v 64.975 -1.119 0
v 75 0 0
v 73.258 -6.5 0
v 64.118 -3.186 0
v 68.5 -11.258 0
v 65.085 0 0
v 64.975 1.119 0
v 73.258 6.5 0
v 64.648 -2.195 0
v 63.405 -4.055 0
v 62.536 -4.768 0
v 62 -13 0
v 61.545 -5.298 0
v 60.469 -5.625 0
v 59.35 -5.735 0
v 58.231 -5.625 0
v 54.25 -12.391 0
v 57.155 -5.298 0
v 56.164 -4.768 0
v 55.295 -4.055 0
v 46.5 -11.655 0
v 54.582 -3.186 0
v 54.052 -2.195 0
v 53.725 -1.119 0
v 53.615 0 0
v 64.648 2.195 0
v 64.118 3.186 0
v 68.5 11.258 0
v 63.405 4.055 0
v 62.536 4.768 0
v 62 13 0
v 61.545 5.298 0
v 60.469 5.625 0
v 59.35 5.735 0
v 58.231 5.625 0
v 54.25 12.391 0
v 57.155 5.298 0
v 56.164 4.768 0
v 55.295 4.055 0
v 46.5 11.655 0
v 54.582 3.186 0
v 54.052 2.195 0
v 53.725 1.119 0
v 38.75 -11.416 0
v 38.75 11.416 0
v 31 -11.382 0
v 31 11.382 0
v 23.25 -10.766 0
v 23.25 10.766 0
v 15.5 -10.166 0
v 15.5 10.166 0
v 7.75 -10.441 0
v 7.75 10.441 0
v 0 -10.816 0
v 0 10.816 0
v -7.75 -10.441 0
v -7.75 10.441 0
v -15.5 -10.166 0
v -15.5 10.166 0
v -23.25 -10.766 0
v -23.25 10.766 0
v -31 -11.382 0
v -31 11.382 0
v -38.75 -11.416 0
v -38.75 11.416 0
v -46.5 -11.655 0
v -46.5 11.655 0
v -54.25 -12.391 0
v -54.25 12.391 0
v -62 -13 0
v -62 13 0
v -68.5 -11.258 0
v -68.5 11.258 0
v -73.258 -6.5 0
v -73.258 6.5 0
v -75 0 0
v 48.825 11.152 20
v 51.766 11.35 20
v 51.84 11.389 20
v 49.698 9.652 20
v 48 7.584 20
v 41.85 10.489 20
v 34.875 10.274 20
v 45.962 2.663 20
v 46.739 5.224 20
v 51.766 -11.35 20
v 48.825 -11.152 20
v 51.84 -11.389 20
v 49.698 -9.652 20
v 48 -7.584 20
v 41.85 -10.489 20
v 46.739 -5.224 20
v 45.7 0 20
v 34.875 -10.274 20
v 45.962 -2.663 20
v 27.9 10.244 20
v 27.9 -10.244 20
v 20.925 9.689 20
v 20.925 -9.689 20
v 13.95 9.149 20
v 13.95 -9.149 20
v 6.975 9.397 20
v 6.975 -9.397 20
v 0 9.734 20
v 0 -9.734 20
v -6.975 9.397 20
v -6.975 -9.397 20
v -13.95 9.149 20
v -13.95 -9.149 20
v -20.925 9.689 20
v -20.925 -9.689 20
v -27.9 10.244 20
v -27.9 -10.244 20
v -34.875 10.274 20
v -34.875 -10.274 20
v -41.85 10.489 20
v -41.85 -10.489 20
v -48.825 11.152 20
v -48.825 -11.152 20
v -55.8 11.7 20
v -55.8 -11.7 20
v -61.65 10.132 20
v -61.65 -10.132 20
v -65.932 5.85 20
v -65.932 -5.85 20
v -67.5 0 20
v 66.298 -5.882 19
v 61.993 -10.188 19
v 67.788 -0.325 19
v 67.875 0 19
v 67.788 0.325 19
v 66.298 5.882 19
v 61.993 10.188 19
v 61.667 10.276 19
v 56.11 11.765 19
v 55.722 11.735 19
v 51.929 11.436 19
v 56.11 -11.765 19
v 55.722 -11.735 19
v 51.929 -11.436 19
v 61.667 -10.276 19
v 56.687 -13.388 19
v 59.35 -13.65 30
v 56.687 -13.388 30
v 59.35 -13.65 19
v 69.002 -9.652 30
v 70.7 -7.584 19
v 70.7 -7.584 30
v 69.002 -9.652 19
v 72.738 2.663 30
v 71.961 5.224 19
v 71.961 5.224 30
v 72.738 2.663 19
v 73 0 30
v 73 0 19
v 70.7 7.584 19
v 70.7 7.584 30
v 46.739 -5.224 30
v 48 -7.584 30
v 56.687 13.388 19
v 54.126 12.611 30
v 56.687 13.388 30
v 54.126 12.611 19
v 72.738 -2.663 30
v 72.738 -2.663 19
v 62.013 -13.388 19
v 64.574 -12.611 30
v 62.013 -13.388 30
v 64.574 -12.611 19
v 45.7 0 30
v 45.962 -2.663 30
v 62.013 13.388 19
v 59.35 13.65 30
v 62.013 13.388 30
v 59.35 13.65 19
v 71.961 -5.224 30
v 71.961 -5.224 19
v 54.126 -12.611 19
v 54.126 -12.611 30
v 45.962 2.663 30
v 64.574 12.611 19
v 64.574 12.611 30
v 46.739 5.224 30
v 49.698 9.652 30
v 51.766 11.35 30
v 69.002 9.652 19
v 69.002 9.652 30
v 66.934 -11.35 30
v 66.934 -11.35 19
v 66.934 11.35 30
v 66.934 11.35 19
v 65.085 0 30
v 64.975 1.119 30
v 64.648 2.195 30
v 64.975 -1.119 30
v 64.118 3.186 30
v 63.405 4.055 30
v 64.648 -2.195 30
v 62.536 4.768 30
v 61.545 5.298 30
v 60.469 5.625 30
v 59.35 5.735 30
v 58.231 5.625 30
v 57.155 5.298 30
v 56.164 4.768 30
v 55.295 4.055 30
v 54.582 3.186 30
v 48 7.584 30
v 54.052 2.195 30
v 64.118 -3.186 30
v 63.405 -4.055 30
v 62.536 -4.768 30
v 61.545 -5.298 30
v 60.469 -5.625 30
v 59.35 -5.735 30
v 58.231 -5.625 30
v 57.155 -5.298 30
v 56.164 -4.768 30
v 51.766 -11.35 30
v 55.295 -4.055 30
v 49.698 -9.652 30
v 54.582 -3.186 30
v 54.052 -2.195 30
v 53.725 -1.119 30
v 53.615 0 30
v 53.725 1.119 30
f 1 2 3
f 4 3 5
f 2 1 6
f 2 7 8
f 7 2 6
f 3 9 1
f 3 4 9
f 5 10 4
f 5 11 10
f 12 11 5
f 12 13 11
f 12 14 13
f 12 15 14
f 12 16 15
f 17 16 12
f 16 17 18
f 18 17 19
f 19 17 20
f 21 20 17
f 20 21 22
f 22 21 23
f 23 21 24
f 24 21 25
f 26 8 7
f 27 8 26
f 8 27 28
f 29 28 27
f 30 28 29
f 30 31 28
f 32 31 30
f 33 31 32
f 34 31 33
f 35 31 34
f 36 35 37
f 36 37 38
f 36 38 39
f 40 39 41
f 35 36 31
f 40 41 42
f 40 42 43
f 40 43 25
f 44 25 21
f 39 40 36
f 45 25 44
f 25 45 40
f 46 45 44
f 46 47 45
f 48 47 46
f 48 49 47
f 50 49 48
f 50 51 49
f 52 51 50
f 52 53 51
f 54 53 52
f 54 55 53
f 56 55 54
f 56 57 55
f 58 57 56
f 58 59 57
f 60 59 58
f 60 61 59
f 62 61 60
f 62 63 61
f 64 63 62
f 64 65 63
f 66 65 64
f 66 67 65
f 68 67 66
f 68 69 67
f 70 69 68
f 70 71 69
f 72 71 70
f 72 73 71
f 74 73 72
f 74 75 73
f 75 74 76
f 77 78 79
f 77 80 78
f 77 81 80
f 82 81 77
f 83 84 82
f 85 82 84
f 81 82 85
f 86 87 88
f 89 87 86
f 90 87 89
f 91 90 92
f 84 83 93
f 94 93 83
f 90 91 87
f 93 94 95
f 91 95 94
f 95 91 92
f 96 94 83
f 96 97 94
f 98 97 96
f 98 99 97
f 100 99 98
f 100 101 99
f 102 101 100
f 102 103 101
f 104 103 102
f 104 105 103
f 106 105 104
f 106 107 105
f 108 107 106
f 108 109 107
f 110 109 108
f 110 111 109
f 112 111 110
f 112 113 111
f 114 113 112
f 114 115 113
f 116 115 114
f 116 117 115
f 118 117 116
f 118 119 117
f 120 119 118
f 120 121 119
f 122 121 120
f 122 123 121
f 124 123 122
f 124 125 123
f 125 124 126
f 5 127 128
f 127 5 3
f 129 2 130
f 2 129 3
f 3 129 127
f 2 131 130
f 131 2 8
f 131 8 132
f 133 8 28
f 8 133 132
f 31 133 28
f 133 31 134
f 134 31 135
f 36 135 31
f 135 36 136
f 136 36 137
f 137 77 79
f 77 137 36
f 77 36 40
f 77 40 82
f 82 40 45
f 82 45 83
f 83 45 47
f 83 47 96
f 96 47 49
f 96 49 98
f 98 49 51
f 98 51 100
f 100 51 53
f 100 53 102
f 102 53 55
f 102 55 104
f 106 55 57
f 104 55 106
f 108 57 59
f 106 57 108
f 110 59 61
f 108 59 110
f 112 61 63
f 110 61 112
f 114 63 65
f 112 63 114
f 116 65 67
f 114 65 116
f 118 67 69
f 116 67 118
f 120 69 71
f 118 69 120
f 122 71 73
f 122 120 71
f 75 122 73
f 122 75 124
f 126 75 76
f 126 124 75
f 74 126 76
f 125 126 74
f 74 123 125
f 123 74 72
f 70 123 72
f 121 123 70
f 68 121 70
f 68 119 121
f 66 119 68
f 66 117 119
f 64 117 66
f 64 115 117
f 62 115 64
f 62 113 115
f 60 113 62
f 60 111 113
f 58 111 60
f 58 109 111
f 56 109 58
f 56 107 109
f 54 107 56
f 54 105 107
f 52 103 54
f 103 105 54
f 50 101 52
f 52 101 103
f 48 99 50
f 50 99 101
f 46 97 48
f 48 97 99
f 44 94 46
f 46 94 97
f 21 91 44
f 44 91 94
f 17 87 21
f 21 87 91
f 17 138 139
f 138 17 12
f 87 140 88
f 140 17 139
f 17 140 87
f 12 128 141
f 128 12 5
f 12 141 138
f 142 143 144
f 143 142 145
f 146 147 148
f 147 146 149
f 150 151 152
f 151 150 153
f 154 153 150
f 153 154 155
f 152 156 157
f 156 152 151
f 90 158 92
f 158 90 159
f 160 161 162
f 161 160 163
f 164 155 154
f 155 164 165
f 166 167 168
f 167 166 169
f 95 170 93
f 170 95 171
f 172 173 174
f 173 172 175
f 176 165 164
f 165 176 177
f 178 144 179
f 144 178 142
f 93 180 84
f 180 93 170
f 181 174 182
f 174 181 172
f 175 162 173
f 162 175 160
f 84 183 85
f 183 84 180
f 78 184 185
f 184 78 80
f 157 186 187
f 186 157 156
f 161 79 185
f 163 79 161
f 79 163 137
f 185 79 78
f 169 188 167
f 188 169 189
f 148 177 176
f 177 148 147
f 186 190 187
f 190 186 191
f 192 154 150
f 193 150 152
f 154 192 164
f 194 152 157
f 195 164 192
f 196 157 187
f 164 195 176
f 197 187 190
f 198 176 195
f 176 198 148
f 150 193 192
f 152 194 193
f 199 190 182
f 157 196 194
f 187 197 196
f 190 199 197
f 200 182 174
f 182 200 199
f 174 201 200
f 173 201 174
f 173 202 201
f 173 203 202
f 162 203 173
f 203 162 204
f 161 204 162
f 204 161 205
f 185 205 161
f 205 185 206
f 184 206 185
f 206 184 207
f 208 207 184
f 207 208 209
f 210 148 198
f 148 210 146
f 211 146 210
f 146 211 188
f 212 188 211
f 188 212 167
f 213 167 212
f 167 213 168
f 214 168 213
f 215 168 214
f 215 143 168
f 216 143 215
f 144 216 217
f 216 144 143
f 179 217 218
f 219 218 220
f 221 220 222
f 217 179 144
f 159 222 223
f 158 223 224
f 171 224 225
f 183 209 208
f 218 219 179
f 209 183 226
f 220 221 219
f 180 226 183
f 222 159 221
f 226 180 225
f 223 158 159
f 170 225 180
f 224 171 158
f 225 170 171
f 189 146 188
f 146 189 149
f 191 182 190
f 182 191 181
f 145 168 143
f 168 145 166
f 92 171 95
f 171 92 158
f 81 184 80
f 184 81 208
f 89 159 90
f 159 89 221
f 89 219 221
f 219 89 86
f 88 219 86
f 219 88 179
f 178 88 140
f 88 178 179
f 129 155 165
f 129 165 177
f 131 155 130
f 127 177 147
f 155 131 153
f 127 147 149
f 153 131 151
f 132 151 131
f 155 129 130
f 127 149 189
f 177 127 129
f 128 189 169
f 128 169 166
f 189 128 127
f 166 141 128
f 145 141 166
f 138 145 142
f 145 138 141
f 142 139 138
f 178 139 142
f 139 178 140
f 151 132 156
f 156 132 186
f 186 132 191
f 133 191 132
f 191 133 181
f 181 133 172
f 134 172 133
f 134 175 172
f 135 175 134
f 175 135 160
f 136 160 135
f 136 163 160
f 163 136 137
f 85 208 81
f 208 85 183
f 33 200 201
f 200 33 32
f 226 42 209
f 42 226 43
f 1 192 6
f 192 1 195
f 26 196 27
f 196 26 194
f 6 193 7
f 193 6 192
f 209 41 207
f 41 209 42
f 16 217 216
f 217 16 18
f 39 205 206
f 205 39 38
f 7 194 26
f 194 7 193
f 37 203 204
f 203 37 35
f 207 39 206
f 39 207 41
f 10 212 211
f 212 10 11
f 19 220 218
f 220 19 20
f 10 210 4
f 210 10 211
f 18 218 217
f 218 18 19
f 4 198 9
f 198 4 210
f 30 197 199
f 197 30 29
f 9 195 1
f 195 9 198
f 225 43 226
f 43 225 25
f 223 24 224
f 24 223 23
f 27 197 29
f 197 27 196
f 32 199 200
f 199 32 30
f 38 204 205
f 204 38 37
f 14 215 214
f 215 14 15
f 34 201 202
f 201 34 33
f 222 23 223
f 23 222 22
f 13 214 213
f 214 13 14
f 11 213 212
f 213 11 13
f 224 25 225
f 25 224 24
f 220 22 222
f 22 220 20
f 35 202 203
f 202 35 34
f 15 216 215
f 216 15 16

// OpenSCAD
$fn = 32;

// ----------------------------------------------------------------------
// Handle: 150 x 26 mm grip, 20 mm thick
// ----------------------------------------------------------------------

// --- parameters (mm) ---
length = 150;             // grip length
width = 26;               // grip width
thickness = 20;           // grip thickness
waist = 0.8;              // width factor at the middle
draft = 0.9;              // top face scale of the extrusion
scallops = 4;             // finger rests per side
ripple = 0.04;            // depth factor of the finger rests
boss_d = 27.3;            // mounting boss diameter
boss_h = 10;              // mounting boss height
boss_hole_d = 11.47;      // screw clearance through the boss
boss_r = 59.35;           // boss centre from the grip centre

/* ergonomic grip outline, closed spline-like polygon in the XY plane */
grip = [[-62, 13], [-54.25, 12.391], [-46.5, 11.655], [-38.75, 11.416], [-31, 11.382], [-23.25, 10.766], [-15.5, 10.166], [-7.75, 10.441], [0, 10.816], [7.75, 10.441], [15.5, 10.166], [23.25, 10.766], [31, 11.382], [38.75, 11.416], [46.5, 11.655], [54.25, 12.391], [62, 13], [68.5, 11.258], [73.258, 6.5], [75, 0], [73.258, -6.5], [68.5, -11.258], [62, -13], [62, -13], [54.25, -12.391], [46.5, -11.655], [38.75, -11.416], [31, -11.382], [23.25, -10.766], [15.5, -10.166], [7.75, -10.441], [0, -10.816], [-7.75, -10.441], [-15.5, -10.166], [-23.25, -10.766], [-31, -11.382], [-38.75, -11.416], [-46.5, -11.655], [-54.25, -12.391], [-62, -13], [-68.5, -11.258], [-73.258, -6.5], [-75, 0], [-73.258, 6.5], [-68.5, 11.258], [-62, 13]];

module grip_body() {
  linear_extrude(height = thickness, scale = draft) polygon(grip);
}

module boss_body() {
  /* sunk 1 mm into the grip so the joint overlaps */
  translate([boss_r, 0, thickness - 1]) cylinder(h = boss_h + 1, d = boss_d);
}

difference() {
  union() {
    grip_body();
    boss_body();
  }
  translate([boss_r, 0, -1]) cylinder(h = thickness + boss_h + 2, d = boss_hole_d);
}
